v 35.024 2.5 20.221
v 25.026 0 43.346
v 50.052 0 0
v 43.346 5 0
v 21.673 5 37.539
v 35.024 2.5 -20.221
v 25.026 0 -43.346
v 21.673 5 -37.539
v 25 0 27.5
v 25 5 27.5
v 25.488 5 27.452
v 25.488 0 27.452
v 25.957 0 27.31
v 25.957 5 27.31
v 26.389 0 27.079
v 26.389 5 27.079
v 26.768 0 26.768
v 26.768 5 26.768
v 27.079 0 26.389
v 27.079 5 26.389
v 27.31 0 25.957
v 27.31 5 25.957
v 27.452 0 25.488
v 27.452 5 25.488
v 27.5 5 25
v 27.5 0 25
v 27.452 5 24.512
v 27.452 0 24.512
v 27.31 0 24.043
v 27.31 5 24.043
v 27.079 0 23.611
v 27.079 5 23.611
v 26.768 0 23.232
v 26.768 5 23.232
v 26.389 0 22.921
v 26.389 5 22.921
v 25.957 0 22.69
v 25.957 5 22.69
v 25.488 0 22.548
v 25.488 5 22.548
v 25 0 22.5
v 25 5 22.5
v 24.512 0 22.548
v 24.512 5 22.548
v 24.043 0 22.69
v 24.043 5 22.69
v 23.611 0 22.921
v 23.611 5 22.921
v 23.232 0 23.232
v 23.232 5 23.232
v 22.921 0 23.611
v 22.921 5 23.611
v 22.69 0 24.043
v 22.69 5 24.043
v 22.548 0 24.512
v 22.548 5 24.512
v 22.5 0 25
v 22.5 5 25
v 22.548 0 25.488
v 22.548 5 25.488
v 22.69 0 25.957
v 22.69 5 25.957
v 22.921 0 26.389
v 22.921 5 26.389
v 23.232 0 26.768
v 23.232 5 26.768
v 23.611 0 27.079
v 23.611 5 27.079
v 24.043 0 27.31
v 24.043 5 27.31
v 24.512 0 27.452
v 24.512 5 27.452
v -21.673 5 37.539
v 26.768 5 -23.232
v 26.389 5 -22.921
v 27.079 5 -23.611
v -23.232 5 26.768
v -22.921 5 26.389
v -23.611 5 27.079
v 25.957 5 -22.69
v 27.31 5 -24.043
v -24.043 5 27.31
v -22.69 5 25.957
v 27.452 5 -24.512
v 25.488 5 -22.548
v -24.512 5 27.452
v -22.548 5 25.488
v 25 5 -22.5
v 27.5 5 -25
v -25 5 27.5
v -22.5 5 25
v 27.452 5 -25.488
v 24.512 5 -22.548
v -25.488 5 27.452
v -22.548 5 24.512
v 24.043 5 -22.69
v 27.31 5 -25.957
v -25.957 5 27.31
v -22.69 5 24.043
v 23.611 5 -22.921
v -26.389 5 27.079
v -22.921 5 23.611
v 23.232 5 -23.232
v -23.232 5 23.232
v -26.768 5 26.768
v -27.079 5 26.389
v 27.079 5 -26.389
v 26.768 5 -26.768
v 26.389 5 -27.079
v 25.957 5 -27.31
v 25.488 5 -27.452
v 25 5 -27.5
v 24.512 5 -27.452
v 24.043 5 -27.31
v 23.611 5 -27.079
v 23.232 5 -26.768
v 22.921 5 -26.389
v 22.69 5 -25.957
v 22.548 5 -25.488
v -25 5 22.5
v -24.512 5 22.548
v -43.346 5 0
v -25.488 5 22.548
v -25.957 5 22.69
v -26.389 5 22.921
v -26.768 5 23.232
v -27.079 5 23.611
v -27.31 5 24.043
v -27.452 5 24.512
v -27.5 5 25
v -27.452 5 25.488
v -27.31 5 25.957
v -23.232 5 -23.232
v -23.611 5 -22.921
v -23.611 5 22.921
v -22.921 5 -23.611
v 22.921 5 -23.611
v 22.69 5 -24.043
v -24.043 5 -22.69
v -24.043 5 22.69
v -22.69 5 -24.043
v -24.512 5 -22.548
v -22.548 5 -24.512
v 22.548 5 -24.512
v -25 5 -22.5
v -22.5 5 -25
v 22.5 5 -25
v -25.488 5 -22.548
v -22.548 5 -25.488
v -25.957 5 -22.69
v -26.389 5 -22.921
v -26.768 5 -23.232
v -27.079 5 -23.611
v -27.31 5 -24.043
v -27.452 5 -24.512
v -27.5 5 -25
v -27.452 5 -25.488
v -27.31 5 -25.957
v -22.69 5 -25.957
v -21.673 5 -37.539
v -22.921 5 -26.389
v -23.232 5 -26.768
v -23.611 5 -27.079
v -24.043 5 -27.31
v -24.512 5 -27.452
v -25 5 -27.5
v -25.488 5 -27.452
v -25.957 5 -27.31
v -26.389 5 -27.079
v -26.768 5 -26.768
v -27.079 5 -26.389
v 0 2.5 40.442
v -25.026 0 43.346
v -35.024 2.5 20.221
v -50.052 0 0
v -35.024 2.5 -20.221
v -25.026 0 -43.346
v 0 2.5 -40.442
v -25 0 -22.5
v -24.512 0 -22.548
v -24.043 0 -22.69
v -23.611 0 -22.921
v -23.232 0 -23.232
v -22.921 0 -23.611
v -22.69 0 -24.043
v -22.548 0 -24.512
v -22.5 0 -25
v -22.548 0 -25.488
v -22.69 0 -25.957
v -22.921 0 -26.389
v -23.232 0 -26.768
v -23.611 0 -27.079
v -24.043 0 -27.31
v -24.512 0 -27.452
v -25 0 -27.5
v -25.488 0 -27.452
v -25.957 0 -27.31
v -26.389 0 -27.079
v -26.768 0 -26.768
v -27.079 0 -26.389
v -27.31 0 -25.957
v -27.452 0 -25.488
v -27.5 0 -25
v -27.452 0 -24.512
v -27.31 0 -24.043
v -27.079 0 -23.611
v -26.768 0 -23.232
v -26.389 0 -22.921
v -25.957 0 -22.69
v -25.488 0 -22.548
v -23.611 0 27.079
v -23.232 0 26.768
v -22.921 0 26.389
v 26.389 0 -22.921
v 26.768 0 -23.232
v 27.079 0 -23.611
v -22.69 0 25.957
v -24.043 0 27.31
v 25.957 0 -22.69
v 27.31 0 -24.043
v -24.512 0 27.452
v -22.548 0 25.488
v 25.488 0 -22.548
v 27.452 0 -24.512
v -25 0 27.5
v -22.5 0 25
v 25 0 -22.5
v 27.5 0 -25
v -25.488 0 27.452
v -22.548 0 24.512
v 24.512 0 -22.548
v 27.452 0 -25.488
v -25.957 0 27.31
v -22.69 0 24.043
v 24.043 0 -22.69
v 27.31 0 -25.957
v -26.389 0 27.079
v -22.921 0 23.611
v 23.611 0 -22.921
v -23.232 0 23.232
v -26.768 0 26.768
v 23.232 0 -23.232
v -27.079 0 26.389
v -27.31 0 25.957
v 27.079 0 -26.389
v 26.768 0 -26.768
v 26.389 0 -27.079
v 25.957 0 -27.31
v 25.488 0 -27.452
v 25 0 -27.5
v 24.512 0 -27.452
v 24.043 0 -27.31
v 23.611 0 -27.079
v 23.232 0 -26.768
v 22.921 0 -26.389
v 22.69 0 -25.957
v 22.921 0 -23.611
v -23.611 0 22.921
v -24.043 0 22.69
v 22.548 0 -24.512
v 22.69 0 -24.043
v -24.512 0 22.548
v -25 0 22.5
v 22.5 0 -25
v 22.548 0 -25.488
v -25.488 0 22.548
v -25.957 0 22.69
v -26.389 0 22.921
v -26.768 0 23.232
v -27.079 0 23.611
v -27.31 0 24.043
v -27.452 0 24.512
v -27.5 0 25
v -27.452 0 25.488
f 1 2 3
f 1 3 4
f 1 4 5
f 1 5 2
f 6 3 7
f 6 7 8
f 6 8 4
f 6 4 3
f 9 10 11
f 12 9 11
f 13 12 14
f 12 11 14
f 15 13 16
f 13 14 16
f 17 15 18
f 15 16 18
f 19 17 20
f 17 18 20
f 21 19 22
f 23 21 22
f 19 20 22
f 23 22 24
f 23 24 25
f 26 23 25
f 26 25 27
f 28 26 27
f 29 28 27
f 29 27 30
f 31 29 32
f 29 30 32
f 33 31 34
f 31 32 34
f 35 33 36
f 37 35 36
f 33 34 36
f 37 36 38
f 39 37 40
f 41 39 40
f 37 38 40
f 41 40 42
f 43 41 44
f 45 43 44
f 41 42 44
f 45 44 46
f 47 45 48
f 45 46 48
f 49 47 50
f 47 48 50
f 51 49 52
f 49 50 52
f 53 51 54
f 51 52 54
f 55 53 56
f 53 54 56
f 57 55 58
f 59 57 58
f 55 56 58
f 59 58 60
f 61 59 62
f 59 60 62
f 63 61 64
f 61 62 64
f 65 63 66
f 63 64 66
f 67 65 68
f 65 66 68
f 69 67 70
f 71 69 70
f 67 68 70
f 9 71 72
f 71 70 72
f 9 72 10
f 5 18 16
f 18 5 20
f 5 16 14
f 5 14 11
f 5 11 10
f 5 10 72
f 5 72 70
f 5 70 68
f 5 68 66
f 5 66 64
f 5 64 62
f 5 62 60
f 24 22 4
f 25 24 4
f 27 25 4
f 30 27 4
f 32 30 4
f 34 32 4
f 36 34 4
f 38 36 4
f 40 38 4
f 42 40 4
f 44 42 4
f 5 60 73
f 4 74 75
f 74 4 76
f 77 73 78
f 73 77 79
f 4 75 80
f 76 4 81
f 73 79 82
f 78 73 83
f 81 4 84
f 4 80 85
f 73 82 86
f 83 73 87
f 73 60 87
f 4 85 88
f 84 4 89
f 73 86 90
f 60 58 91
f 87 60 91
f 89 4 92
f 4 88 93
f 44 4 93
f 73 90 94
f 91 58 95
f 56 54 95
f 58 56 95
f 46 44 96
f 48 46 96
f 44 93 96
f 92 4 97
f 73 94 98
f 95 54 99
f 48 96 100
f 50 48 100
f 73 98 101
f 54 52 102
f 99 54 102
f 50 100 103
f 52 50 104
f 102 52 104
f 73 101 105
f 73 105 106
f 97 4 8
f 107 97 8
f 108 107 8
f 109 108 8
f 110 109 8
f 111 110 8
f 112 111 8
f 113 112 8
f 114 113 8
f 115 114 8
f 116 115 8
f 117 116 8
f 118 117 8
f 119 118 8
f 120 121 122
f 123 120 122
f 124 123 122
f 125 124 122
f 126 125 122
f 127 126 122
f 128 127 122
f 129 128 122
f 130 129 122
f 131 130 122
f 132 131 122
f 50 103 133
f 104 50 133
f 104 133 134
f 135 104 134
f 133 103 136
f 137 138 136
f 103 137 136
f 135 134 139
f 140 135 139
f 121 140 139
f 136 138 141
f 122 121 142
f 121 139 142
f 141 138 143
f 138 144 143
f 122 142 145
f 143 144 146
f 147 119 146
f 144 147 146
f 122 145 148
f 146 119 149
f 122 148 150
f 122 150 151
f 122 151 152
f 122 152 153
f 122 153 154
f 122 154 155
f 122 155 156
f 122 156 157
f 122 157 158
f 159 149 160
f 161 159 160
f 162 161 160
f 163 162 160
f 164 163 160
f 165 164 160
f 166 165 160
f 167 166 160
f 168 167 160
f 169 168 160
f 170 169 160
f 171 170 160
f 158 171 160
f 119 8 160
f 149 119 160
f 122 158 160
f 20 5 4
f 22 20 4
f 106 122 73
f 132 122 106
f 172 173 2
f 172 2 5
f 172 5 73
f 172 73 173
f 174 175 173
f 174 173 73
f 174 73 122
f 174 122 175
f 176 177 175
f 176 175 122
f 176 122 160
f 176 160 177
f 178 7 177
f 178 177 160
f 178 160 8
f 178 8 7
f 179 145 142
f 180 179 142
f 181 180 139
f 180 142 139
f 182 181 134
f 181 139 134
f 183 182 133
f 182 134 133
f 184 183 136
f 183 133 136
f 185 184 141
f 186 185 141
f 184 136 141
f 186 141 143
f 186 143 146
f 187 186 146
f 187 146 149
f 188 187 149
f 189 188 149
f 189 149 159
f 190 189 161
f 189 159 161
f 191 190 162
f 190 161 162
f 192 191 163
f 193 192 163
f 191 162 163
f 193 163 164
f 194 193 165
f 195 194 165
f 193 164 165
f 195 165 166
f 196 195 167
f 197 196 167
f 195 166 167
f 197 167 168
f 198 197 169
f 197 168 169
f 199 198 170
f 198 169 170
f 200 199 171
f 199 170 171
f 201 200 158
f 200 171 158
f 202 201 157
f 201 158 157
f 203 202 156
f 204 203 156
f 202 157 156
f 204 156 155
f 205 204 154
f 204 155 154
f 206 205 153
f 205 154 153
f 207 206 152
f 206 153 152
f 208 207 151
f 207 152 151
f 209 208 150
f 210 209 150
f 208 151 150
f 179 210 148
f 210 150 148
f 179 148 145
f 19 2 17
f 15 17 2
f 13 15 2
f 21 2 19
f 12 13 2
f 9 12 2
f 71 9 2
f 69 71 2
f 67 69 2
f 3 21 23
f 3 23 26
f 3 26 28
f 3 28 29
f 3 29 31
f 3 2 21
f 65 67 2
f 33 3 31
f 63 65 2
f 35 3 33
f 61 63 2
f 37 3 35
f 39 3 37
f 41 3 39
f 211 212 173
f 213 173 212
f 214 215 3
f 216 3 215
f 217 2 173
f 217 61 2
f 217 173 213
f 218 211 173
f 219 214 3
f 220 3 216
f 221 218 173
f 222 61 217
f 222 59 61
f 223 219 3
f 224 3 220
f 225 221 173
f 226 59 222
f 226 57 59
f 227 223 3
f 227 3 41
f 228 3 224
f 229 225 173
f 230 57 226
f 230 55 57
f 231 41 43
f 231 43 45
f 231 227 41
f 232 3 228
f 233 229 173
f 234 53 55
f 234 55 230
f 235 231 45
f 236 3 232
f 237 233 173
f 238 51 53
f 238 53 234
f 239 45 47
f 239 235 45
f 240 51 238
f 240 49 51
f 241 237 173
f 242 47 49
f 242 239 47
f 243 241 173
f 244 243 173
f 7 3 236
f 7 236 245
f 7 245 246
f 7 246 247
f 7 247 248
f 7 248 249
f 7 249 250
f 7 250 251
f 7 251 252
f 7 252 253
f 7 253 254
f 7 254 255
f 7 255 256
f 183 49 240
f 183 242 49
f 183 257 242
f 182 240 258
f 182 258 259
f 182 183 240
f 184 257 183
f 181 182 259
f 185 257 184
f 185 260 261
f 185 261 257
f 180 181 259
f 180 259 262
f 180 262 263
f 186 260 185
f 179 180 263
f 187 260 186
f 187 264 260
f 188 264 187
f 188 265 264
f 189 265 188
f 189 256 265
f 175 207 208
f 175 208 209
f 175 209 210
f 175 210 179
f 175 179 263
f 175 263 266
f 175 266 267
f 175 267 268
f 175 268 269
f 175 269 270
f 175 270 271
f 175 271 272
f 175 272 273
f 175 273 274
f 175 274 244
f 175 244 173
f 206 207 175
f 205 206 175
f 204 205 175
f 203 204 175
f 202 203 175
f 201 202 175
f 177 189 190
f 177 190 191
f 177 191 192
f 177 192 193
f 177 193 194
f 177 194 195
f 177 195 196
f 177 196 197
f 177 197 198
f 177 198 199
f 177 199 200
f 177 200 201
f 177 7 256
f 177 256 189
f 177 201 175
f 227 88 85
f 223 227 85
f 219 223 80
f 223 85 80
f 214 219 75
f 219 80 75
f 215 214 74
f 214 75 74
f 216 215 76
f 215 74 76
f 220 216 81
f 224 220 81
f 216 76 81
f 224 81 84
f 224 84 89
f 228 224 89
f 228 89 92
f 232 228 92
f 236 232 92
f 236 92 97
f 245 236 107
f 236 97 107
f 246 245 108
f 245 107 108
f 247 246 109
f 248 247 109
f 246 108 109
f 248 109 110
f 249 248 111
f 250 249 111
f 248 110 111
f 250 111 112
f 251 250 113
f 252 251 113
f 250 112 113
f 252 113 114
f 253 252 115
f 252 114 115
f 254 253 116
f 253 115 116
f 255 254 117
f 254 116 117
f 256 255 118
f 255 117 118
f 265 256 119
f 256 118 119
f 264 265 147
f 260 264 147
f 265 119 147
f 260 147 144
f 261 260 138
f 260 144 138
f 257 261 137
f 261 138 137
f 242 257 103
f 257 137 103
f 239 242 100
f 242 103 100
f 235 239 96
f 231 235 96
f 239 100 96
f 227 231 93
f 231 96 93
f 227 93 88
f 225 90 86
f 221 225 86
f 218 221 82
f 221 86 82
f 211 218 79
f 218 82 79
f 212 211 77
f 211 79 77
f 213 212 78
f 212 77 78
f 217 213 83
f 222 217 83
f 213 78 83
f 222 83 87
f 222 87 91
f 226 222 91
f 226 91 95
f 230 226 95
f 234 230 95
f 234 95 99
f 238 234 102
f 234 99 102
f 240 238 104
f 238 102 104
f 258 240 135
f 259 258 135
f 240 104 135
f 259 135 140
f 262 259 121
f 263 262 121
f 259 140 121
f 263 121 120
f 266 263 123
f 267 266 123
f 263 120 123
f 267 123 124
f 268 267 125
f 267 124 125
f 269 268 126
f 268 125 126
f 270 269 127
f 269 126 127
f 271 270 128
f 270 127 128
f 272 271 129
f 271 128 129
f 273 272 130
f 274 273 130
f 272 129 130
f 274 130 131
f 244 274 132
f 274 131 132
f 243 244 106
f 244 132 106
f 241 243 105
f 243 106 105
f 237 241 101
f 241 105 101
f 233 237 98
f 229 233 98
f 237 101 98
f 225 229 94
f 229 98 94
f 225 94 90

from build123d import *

# Parameters (mm, degrees)
SKETCH4_R          = 2.5
CUT_EXTRUDE1_DEPTH = 5
SKETCH5_R          = 2.5
CUT_EXTRUDE2_DEPTH = 5
SKETCH6_R          = 2.5
CUT_EXTRUDE3_DEPTH = 5
SKETCH7_R          = 2.5
CUT_EXTRUDE4_DEPTH = 5


with BuildPart() as part:
    # Sketch1 → Loft3 section 0
    with BuildSketch(Plane(origin=(0, 0, 0), x_dir=(1, 0, 0), z_dir=(0, 1, 0))):
        with BuildLine():
            Line((50.051560618, 0), (25.025780309, 43.345922995))
            Line((25.025780309, 43.345922995), (-25.025780309, 43.345922995))
            Line((-25.025780309, 43.345922995), (-50.051560618, 0))
            Line((-50.051560618, 0), (-25.025780309, -43.345922995))
            Line((-25.025780309, -43.345922995), (25.025780309, -43.345922995))
            Line((25.025780309, -43.345922995), (50.051560618, 0))
        make_face()
    # Sketch2 → Loft3 section 1
    with BuildSketch(Plane(origin=(0, 5, 0), x_dir=(1, 0, 0), z_dir=(0, 1, 0))):
        with BuildLine():
            Line((43.345922995, 0), (21.672961497, 37.538670464))
            Line((21.672961497, 37.538670464), (-21.672961497, 37.538670464))
            Line((-21.672961497, 37.538670464), (-43.345922995, 0))
            Line((-43.345922995, 0), (-21.672961497, -37.538670464))
            Line((-21.672961497, -37.538670464), (21.672961497, -37.538670464))
            Line((21.672961497, -37.538670464), (43.345922995, 0))
        make_face()
    loft()

    # Sketch4 → Cut-Extrude1 (cut)
    with BuildSketch(Plane(origin=(0, 5, 0), x_dir=(1, 0, 0), z_dir=(0, 1, 0))):
        with Locations(Location((-25, 25, 0), (0, 0, 270))):
            Circle(SKETCH4_R)
    extrude(amount=-CUT_EXTRUDE1_DEPTH, mode=Mode.SUBTRACT)

    # Sketch5 → Cut-Extrude2 (cut)
    with BuildSketch(Plane(origin=(0, 5, 0), x_dir=(1, 0, 0), z_dir=(0, 1, 0))):
        with Locations(Location((25, 25, 0), (0, 0, 270))):
            Circle(SKETCH5_R)
    extrude(amount=-CUT_EXTRUDE2_DEPTH, mode=Mode.SUBTRACT)

    # Sketch6 → Cut-Extrude3 (cut)
    with BuildSketch(Plane(origin=(0, 5, 0), x_dir=(1, 0, 0), z_dir=(0, 1, 0))):
        with Locations(Location((-25, -25, 0), (0, 0, 270))):
            Circle(SKETCH6_R)
    extrude(amount=-CUT_EXTRUDE3_DEPTH, mode=Mode.SUBTRACT)

    # Sketch7 → Cut-Extrude4 (cut)
    with BuildSketch(Plane(origin=(0, 5, 0), x_dir=(1, 0, 0), z_dir=(0, 1, 0))):
        with Locations(Location((25, -25, 0), (0, 0, 270))):
            Circle(SKETCH7_R)
    extrude(amount=-CUT_EXTRUDE4_DEPTH, mode=Mode.SUBTRACT)


solid = part.part
